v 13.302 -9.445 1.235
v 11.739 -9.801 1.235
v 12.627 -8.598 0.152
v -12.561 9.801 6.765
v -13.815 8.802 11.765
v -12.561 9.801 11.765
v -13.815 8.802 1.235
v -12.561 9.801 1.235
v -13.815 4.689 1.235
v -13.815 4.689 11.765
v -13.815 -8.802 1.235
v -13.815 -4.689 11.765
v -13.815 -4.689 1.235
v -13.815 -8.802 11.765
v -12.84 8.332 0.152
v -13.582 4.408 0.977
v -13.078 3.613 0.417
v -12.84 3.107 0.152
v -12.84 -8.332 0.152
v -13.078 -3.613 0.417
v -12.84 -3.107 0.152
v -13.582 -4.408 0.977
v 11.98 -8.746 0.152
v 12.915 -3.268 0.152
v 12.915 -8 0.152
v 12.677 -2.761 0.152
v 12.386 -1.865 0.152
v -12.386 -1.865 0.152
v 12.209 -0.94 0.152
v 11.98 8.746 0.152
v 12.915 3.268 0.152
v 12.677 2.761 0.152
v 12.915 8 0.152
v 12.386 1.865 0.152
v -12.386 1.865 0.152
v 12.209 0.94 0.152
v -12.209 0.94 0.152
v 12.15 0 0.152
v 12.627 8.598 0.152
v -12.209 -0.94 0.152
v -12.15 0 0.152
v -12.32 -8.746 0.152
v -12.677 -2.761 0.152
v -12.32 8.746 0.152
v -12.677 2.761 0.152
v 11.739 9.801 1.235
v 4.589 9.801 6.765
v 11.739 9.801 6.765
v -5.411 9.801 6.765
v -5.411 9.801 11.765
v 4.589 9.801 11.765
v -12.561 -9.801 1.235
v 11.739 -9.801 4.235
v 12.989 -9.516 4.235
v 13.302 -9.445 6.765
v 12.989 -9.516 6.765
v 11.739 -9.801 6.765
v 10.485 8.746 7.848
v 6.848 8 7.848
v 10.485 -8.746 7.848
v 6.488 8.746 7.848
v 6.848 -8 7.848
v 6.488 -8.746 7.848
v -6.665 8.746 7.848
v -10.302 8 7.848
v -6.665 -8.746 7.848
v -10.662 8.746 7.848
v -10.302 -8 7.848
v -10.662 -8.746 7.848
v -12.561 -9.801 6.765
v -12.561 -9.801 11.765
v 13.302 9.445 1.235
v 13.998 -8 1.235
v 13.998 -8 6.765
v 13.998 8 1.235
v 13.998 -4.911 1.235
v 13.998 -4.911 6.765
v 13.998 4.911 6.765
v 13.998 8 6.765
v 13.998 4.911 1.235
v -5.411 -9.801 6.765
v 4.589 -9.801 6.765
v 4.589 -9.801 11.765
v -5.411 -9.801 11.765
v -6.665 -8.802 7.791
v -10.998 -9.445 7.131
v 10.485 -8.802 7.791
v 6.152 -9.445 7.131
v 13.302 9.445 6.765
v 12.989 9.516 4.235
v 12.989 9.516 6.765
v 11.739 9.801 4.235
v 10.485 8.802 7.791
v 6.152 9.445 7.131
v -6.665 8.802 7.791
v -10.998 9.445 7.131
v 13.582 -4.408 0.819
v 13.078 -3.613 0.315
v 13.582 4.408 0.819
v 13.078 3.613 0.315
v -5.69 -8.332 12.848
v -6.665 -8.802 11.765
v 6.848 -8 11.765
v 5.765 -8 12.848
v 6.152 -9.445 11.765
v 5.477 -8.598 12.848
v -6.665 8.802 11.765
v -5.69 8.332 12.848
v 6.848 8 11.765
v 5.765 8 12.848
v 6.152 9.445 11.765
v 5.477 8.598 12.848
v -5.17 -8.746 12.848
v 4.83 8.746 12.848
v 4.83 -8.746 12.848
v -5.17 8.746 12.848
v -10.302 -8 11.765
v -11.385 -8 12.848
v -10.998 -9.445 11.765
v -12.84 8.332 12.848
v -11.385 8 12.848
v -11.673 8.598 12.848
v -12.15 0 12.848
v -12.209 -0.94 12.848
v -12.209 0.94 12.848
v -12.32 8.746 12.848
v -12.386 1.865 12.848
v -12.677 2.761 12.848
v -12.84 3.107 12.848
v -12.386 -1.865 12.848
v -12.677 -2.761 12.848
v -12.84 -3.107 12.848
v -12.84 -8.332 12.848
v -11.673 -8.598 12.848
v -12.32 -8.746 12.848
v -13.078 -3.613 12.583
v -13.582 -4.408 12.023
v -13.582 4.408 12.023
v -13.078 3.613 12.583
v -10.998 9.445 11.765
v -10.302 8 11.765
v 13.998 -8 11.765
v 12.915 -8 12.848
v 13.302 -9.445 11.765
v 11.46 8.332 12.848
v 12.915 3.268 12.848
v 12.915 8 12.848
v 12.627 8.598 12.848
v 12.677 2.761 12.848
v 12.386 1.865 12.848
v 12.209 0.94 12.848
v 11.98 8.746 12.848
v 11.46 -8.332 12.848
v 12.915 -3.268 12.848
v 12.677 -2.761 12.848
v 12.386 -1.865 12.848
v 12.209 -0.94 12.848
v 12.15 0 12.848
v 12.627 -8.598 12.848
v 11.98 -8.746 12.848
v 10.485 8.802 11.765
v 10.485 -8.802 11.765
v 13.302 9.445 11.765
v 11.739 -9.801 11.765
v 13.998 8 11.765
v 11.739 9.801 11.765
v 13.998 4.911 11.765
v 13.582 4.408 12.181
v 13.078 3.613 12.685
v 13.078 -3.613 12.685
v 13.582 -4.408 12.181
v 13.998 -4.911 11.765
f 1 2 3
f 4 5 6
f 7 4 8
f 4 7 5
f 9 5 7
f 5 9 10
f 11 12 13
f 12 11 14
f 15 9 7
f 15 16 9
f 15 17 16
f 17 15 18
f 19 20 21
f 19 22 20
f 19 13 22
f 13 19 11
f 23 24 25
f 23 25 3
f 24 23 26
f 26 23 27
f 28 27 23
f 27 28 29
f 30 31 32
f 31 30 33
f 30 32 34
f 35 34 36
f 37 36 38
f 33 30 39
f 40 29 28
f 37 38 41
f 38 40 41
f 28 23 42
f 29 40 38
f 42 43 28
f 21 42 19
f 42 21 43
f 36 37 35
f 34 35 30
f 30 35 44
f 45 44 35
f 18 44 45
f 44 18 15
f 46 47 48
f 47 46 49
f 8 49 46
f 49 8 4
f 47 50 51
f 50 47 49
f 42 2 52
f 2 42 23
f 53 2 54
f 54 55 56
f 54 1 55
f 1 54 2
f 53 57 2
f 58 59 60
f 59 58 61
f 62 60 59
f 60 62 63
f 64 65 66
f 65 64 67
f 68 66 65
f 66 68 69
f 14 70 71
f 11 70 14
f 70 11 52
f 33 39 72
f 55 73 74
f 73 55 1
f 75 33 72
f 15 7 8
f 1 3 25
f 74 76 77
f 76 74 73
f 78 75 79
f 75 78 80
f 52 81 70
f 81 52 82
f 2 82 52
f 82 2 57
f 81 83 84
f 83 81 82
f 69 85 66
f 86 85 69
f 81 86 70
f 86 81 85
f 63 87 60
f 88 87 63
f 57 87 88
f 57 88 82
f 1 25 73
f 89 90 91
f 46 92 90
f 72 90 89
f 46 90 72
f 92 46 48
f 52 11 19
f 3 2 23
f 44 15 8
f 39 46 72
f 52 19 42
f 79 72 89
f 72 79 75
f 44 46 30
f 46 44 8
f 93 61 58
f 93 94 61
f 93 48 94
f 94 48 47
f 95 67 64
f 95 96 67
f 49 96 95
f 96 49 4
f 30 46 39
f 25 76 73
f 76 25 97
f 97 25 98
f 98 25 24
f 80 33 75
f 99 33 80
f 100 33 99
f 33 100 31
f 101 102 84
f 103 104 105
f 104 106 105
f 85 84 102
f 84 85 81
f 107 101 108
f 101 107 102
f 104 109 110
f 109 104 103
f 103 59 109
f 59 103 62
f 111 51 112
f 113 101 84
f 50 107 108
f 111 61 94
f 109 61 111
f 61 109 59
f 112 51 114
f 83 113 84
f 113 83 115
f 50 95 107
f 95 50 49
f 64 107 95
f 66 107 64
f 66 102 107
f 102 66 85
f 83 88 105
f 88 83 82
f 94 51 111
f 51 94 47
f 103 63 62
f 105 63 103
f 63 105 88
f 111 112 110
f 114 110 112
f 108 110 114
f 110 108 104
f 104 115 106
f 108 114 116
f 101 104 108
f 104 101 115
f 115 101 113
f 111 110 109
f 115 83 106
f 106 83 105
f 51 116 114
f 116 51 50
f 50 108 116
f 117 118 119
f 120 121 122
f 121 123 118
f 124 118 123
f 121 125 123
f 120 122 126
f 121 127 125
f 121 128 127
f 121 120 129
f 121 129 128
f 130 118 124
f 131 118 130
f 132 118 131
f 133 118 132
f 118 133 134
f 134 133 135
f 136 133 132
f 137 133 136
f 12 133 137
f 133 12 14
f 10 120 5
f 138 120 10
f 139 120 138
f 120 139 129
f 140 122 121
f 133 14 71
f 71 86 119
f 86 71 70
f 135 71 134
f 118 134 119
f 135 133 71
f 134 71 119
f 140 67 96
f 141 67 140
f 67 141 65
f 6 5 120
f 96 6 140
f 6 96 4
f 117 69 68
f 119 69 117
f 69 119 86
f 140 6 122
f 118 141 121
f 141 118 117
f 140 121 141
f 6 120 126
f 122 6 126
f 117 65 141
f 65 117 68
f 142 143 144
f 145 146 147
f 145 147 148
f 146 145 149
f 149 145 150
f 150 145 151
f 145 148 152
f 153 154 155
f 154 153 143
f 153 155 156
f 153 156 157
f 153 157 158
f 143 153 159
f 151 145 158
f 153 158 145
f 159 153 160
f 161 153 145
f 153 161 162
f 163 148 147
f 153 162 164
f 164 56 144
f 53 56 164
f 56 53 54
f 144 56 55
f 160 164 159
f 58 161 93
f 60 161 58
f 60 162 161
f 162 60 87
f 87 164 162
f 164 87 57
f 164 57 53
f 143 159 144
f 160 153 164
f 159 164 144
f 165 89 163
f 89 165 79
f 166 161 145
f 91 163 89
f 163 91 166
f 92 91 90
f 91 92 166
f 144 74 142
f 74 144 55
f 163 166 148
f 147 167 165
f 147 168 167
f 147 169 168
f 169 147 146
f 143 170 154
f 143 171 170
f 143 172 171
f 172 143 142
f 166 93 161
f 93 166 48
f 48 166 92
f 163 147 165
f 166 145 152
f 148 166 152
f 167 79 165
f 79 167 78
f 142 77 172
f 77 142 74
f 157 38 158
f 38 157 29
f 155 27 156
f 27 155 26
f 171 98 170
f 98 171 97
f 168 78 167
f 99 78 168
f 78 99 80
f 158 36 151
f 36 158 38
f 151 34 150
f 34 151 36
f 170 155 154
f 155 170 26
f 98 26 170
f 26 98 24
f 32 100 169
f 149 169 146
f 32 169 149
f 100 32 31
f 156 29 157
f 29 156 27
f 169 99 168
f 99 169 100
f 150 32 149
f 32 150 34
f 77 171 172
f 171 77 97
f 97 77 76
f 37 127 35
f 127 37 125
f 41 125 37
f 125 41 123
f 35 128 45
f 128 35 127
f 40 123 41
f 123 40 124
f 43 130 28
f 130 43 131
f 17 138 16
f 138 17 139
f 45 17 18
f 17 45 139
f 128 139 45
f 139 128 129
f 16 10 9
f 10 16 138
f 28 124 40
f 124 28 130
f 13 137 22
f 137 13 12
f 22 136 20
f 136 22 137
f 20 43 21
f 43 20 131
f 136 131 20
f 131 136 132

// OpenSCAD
// file: ../globals.scad
/*
Most things in this file is represented as one millimeter, so keep that in mind while changing things.
Some of the setting are not mm but at variables that you can set, such as 2*x=2x and you are setting what x is.
I will try to specify when things are variables and not exact measurements.
*/

// printer slop
slop = 0.15;

obj_leg = 30;
leg_length = 5.5;
small_number = 0.001;
metal_core_rode_global = 5;


///////////////// number of holes /////////////////////
z_hole_number = 8;
other_holes = 8;

///////////////// Pins /////////////////////

//pins that poke out
ball_size = 10;
pin_height = 20;
pin_diameter = 6;


//holes
hole_ball_size = ball_size;
hole_pin_height = pin_height;
hole_pin_diameter = pin_diameter;

///////////////// Z THINGS /////////////////////

berring_slot_width = 7.5;
berring_slot_depth = 6.5;
metal_core_rode = 5;

///////////////// X THINGS /////////////////////

//male dove tails
male_dove_max_width=8;
male_dove_min_width=5;
male_dove_depth=5;
male_dove_height=obj_leg/2;

function scaled_male_dove_max_width() = male_dove_max_width - slop;
function scaled_male_dove_min_width() = male_dove_min_width - slop;
function scaled_male_dove_depth() = male_dove_depth - slop;

//female dove tails, this is found on the y mounts
girl_max_width=11;
girl_min_width=5;
girl_depth=5;
girl_height=obj_leg;


///////////////// Y THINGS /////////////////////
/*
The Y is so normal that all of those global variables at the top should change all of the setting in it, this section is set her incase there are variables set in the future development of this project.
*/

// stepper
motor_side_length = 43.2;
motor_bolt_hole_distance = 31;
motor_center_hole = 23;
motor_shaft_dia = 5;
motor_shaft_hole_dia = 5+2*slop;

// bolts etc.
bolt_hole_dia = 3+2*slop;
bolt_head_hole_dia = 5.8;

m4_bolt_hole_dia = 4+2*slop;
m4_bolt_head_hole_dia = 6.8+2*slop;


m3_nut_side = 5.65;
m3_nut_height = 2.3;
m4_nut_side = 6.85;
m4_nut_height = 3.1;

// threaded rod
lifter_rod_diam = 9.86;
hole_threaded_rod = lifter_rod_diam+2*slop;

// for the extensions
metal_rod_size = 9;
// main file
include <../globals.scad>;
include <../include.scad>;

length = 130; // should be enough
hex_width = 15; // same as bed rail width

module rail_jig() {

    difference() {
        union() {
            translate([0,0,30/2]) cube([12,length,20], center=true);
            translate([0,length/2,30]) rotate([90,0,0]) hexagon(hex_width+6, length);
            translate([0,0,40]) cube([18,length,13], center=true);
        }
        translate([0,length/2, 30]) rotate([90,0,0]) hexagon(hex_width, length);
        translate([0,0,20]) cube([1,length,19],center=true);
        translate([0,0,35]) cube([30,10,30],center=true);
        
        translate([0,0,50]) cube([12,length,32],center=true);
        
    }


}

module rail_jig_clip() {
    w = 14+2*3+2*4+2*slop;
    difference() {
        translate([0,0,8/2]) union() {
            rounded_cube(w,20,8,4, center=true);
            translate([0,0,4]) rounded_cube(14,20,10,4, center=true);
            translate([-w/2+2,0,4]) rounded_cube(4,20,10,4, center=true);
            translate([w/2-2,0,4]) rounded_cube(4,20,10,4, center=true);
        }
        translate([w/2+15/2-2,0,0]) cylinder(d=15,h=15, $fn=50);
        translate([-w/2-15/2+2,0,0]) cylinder(d=15,h=15, $fn=50);
    }
}

//rail_jig();
rail_jig_clip();
